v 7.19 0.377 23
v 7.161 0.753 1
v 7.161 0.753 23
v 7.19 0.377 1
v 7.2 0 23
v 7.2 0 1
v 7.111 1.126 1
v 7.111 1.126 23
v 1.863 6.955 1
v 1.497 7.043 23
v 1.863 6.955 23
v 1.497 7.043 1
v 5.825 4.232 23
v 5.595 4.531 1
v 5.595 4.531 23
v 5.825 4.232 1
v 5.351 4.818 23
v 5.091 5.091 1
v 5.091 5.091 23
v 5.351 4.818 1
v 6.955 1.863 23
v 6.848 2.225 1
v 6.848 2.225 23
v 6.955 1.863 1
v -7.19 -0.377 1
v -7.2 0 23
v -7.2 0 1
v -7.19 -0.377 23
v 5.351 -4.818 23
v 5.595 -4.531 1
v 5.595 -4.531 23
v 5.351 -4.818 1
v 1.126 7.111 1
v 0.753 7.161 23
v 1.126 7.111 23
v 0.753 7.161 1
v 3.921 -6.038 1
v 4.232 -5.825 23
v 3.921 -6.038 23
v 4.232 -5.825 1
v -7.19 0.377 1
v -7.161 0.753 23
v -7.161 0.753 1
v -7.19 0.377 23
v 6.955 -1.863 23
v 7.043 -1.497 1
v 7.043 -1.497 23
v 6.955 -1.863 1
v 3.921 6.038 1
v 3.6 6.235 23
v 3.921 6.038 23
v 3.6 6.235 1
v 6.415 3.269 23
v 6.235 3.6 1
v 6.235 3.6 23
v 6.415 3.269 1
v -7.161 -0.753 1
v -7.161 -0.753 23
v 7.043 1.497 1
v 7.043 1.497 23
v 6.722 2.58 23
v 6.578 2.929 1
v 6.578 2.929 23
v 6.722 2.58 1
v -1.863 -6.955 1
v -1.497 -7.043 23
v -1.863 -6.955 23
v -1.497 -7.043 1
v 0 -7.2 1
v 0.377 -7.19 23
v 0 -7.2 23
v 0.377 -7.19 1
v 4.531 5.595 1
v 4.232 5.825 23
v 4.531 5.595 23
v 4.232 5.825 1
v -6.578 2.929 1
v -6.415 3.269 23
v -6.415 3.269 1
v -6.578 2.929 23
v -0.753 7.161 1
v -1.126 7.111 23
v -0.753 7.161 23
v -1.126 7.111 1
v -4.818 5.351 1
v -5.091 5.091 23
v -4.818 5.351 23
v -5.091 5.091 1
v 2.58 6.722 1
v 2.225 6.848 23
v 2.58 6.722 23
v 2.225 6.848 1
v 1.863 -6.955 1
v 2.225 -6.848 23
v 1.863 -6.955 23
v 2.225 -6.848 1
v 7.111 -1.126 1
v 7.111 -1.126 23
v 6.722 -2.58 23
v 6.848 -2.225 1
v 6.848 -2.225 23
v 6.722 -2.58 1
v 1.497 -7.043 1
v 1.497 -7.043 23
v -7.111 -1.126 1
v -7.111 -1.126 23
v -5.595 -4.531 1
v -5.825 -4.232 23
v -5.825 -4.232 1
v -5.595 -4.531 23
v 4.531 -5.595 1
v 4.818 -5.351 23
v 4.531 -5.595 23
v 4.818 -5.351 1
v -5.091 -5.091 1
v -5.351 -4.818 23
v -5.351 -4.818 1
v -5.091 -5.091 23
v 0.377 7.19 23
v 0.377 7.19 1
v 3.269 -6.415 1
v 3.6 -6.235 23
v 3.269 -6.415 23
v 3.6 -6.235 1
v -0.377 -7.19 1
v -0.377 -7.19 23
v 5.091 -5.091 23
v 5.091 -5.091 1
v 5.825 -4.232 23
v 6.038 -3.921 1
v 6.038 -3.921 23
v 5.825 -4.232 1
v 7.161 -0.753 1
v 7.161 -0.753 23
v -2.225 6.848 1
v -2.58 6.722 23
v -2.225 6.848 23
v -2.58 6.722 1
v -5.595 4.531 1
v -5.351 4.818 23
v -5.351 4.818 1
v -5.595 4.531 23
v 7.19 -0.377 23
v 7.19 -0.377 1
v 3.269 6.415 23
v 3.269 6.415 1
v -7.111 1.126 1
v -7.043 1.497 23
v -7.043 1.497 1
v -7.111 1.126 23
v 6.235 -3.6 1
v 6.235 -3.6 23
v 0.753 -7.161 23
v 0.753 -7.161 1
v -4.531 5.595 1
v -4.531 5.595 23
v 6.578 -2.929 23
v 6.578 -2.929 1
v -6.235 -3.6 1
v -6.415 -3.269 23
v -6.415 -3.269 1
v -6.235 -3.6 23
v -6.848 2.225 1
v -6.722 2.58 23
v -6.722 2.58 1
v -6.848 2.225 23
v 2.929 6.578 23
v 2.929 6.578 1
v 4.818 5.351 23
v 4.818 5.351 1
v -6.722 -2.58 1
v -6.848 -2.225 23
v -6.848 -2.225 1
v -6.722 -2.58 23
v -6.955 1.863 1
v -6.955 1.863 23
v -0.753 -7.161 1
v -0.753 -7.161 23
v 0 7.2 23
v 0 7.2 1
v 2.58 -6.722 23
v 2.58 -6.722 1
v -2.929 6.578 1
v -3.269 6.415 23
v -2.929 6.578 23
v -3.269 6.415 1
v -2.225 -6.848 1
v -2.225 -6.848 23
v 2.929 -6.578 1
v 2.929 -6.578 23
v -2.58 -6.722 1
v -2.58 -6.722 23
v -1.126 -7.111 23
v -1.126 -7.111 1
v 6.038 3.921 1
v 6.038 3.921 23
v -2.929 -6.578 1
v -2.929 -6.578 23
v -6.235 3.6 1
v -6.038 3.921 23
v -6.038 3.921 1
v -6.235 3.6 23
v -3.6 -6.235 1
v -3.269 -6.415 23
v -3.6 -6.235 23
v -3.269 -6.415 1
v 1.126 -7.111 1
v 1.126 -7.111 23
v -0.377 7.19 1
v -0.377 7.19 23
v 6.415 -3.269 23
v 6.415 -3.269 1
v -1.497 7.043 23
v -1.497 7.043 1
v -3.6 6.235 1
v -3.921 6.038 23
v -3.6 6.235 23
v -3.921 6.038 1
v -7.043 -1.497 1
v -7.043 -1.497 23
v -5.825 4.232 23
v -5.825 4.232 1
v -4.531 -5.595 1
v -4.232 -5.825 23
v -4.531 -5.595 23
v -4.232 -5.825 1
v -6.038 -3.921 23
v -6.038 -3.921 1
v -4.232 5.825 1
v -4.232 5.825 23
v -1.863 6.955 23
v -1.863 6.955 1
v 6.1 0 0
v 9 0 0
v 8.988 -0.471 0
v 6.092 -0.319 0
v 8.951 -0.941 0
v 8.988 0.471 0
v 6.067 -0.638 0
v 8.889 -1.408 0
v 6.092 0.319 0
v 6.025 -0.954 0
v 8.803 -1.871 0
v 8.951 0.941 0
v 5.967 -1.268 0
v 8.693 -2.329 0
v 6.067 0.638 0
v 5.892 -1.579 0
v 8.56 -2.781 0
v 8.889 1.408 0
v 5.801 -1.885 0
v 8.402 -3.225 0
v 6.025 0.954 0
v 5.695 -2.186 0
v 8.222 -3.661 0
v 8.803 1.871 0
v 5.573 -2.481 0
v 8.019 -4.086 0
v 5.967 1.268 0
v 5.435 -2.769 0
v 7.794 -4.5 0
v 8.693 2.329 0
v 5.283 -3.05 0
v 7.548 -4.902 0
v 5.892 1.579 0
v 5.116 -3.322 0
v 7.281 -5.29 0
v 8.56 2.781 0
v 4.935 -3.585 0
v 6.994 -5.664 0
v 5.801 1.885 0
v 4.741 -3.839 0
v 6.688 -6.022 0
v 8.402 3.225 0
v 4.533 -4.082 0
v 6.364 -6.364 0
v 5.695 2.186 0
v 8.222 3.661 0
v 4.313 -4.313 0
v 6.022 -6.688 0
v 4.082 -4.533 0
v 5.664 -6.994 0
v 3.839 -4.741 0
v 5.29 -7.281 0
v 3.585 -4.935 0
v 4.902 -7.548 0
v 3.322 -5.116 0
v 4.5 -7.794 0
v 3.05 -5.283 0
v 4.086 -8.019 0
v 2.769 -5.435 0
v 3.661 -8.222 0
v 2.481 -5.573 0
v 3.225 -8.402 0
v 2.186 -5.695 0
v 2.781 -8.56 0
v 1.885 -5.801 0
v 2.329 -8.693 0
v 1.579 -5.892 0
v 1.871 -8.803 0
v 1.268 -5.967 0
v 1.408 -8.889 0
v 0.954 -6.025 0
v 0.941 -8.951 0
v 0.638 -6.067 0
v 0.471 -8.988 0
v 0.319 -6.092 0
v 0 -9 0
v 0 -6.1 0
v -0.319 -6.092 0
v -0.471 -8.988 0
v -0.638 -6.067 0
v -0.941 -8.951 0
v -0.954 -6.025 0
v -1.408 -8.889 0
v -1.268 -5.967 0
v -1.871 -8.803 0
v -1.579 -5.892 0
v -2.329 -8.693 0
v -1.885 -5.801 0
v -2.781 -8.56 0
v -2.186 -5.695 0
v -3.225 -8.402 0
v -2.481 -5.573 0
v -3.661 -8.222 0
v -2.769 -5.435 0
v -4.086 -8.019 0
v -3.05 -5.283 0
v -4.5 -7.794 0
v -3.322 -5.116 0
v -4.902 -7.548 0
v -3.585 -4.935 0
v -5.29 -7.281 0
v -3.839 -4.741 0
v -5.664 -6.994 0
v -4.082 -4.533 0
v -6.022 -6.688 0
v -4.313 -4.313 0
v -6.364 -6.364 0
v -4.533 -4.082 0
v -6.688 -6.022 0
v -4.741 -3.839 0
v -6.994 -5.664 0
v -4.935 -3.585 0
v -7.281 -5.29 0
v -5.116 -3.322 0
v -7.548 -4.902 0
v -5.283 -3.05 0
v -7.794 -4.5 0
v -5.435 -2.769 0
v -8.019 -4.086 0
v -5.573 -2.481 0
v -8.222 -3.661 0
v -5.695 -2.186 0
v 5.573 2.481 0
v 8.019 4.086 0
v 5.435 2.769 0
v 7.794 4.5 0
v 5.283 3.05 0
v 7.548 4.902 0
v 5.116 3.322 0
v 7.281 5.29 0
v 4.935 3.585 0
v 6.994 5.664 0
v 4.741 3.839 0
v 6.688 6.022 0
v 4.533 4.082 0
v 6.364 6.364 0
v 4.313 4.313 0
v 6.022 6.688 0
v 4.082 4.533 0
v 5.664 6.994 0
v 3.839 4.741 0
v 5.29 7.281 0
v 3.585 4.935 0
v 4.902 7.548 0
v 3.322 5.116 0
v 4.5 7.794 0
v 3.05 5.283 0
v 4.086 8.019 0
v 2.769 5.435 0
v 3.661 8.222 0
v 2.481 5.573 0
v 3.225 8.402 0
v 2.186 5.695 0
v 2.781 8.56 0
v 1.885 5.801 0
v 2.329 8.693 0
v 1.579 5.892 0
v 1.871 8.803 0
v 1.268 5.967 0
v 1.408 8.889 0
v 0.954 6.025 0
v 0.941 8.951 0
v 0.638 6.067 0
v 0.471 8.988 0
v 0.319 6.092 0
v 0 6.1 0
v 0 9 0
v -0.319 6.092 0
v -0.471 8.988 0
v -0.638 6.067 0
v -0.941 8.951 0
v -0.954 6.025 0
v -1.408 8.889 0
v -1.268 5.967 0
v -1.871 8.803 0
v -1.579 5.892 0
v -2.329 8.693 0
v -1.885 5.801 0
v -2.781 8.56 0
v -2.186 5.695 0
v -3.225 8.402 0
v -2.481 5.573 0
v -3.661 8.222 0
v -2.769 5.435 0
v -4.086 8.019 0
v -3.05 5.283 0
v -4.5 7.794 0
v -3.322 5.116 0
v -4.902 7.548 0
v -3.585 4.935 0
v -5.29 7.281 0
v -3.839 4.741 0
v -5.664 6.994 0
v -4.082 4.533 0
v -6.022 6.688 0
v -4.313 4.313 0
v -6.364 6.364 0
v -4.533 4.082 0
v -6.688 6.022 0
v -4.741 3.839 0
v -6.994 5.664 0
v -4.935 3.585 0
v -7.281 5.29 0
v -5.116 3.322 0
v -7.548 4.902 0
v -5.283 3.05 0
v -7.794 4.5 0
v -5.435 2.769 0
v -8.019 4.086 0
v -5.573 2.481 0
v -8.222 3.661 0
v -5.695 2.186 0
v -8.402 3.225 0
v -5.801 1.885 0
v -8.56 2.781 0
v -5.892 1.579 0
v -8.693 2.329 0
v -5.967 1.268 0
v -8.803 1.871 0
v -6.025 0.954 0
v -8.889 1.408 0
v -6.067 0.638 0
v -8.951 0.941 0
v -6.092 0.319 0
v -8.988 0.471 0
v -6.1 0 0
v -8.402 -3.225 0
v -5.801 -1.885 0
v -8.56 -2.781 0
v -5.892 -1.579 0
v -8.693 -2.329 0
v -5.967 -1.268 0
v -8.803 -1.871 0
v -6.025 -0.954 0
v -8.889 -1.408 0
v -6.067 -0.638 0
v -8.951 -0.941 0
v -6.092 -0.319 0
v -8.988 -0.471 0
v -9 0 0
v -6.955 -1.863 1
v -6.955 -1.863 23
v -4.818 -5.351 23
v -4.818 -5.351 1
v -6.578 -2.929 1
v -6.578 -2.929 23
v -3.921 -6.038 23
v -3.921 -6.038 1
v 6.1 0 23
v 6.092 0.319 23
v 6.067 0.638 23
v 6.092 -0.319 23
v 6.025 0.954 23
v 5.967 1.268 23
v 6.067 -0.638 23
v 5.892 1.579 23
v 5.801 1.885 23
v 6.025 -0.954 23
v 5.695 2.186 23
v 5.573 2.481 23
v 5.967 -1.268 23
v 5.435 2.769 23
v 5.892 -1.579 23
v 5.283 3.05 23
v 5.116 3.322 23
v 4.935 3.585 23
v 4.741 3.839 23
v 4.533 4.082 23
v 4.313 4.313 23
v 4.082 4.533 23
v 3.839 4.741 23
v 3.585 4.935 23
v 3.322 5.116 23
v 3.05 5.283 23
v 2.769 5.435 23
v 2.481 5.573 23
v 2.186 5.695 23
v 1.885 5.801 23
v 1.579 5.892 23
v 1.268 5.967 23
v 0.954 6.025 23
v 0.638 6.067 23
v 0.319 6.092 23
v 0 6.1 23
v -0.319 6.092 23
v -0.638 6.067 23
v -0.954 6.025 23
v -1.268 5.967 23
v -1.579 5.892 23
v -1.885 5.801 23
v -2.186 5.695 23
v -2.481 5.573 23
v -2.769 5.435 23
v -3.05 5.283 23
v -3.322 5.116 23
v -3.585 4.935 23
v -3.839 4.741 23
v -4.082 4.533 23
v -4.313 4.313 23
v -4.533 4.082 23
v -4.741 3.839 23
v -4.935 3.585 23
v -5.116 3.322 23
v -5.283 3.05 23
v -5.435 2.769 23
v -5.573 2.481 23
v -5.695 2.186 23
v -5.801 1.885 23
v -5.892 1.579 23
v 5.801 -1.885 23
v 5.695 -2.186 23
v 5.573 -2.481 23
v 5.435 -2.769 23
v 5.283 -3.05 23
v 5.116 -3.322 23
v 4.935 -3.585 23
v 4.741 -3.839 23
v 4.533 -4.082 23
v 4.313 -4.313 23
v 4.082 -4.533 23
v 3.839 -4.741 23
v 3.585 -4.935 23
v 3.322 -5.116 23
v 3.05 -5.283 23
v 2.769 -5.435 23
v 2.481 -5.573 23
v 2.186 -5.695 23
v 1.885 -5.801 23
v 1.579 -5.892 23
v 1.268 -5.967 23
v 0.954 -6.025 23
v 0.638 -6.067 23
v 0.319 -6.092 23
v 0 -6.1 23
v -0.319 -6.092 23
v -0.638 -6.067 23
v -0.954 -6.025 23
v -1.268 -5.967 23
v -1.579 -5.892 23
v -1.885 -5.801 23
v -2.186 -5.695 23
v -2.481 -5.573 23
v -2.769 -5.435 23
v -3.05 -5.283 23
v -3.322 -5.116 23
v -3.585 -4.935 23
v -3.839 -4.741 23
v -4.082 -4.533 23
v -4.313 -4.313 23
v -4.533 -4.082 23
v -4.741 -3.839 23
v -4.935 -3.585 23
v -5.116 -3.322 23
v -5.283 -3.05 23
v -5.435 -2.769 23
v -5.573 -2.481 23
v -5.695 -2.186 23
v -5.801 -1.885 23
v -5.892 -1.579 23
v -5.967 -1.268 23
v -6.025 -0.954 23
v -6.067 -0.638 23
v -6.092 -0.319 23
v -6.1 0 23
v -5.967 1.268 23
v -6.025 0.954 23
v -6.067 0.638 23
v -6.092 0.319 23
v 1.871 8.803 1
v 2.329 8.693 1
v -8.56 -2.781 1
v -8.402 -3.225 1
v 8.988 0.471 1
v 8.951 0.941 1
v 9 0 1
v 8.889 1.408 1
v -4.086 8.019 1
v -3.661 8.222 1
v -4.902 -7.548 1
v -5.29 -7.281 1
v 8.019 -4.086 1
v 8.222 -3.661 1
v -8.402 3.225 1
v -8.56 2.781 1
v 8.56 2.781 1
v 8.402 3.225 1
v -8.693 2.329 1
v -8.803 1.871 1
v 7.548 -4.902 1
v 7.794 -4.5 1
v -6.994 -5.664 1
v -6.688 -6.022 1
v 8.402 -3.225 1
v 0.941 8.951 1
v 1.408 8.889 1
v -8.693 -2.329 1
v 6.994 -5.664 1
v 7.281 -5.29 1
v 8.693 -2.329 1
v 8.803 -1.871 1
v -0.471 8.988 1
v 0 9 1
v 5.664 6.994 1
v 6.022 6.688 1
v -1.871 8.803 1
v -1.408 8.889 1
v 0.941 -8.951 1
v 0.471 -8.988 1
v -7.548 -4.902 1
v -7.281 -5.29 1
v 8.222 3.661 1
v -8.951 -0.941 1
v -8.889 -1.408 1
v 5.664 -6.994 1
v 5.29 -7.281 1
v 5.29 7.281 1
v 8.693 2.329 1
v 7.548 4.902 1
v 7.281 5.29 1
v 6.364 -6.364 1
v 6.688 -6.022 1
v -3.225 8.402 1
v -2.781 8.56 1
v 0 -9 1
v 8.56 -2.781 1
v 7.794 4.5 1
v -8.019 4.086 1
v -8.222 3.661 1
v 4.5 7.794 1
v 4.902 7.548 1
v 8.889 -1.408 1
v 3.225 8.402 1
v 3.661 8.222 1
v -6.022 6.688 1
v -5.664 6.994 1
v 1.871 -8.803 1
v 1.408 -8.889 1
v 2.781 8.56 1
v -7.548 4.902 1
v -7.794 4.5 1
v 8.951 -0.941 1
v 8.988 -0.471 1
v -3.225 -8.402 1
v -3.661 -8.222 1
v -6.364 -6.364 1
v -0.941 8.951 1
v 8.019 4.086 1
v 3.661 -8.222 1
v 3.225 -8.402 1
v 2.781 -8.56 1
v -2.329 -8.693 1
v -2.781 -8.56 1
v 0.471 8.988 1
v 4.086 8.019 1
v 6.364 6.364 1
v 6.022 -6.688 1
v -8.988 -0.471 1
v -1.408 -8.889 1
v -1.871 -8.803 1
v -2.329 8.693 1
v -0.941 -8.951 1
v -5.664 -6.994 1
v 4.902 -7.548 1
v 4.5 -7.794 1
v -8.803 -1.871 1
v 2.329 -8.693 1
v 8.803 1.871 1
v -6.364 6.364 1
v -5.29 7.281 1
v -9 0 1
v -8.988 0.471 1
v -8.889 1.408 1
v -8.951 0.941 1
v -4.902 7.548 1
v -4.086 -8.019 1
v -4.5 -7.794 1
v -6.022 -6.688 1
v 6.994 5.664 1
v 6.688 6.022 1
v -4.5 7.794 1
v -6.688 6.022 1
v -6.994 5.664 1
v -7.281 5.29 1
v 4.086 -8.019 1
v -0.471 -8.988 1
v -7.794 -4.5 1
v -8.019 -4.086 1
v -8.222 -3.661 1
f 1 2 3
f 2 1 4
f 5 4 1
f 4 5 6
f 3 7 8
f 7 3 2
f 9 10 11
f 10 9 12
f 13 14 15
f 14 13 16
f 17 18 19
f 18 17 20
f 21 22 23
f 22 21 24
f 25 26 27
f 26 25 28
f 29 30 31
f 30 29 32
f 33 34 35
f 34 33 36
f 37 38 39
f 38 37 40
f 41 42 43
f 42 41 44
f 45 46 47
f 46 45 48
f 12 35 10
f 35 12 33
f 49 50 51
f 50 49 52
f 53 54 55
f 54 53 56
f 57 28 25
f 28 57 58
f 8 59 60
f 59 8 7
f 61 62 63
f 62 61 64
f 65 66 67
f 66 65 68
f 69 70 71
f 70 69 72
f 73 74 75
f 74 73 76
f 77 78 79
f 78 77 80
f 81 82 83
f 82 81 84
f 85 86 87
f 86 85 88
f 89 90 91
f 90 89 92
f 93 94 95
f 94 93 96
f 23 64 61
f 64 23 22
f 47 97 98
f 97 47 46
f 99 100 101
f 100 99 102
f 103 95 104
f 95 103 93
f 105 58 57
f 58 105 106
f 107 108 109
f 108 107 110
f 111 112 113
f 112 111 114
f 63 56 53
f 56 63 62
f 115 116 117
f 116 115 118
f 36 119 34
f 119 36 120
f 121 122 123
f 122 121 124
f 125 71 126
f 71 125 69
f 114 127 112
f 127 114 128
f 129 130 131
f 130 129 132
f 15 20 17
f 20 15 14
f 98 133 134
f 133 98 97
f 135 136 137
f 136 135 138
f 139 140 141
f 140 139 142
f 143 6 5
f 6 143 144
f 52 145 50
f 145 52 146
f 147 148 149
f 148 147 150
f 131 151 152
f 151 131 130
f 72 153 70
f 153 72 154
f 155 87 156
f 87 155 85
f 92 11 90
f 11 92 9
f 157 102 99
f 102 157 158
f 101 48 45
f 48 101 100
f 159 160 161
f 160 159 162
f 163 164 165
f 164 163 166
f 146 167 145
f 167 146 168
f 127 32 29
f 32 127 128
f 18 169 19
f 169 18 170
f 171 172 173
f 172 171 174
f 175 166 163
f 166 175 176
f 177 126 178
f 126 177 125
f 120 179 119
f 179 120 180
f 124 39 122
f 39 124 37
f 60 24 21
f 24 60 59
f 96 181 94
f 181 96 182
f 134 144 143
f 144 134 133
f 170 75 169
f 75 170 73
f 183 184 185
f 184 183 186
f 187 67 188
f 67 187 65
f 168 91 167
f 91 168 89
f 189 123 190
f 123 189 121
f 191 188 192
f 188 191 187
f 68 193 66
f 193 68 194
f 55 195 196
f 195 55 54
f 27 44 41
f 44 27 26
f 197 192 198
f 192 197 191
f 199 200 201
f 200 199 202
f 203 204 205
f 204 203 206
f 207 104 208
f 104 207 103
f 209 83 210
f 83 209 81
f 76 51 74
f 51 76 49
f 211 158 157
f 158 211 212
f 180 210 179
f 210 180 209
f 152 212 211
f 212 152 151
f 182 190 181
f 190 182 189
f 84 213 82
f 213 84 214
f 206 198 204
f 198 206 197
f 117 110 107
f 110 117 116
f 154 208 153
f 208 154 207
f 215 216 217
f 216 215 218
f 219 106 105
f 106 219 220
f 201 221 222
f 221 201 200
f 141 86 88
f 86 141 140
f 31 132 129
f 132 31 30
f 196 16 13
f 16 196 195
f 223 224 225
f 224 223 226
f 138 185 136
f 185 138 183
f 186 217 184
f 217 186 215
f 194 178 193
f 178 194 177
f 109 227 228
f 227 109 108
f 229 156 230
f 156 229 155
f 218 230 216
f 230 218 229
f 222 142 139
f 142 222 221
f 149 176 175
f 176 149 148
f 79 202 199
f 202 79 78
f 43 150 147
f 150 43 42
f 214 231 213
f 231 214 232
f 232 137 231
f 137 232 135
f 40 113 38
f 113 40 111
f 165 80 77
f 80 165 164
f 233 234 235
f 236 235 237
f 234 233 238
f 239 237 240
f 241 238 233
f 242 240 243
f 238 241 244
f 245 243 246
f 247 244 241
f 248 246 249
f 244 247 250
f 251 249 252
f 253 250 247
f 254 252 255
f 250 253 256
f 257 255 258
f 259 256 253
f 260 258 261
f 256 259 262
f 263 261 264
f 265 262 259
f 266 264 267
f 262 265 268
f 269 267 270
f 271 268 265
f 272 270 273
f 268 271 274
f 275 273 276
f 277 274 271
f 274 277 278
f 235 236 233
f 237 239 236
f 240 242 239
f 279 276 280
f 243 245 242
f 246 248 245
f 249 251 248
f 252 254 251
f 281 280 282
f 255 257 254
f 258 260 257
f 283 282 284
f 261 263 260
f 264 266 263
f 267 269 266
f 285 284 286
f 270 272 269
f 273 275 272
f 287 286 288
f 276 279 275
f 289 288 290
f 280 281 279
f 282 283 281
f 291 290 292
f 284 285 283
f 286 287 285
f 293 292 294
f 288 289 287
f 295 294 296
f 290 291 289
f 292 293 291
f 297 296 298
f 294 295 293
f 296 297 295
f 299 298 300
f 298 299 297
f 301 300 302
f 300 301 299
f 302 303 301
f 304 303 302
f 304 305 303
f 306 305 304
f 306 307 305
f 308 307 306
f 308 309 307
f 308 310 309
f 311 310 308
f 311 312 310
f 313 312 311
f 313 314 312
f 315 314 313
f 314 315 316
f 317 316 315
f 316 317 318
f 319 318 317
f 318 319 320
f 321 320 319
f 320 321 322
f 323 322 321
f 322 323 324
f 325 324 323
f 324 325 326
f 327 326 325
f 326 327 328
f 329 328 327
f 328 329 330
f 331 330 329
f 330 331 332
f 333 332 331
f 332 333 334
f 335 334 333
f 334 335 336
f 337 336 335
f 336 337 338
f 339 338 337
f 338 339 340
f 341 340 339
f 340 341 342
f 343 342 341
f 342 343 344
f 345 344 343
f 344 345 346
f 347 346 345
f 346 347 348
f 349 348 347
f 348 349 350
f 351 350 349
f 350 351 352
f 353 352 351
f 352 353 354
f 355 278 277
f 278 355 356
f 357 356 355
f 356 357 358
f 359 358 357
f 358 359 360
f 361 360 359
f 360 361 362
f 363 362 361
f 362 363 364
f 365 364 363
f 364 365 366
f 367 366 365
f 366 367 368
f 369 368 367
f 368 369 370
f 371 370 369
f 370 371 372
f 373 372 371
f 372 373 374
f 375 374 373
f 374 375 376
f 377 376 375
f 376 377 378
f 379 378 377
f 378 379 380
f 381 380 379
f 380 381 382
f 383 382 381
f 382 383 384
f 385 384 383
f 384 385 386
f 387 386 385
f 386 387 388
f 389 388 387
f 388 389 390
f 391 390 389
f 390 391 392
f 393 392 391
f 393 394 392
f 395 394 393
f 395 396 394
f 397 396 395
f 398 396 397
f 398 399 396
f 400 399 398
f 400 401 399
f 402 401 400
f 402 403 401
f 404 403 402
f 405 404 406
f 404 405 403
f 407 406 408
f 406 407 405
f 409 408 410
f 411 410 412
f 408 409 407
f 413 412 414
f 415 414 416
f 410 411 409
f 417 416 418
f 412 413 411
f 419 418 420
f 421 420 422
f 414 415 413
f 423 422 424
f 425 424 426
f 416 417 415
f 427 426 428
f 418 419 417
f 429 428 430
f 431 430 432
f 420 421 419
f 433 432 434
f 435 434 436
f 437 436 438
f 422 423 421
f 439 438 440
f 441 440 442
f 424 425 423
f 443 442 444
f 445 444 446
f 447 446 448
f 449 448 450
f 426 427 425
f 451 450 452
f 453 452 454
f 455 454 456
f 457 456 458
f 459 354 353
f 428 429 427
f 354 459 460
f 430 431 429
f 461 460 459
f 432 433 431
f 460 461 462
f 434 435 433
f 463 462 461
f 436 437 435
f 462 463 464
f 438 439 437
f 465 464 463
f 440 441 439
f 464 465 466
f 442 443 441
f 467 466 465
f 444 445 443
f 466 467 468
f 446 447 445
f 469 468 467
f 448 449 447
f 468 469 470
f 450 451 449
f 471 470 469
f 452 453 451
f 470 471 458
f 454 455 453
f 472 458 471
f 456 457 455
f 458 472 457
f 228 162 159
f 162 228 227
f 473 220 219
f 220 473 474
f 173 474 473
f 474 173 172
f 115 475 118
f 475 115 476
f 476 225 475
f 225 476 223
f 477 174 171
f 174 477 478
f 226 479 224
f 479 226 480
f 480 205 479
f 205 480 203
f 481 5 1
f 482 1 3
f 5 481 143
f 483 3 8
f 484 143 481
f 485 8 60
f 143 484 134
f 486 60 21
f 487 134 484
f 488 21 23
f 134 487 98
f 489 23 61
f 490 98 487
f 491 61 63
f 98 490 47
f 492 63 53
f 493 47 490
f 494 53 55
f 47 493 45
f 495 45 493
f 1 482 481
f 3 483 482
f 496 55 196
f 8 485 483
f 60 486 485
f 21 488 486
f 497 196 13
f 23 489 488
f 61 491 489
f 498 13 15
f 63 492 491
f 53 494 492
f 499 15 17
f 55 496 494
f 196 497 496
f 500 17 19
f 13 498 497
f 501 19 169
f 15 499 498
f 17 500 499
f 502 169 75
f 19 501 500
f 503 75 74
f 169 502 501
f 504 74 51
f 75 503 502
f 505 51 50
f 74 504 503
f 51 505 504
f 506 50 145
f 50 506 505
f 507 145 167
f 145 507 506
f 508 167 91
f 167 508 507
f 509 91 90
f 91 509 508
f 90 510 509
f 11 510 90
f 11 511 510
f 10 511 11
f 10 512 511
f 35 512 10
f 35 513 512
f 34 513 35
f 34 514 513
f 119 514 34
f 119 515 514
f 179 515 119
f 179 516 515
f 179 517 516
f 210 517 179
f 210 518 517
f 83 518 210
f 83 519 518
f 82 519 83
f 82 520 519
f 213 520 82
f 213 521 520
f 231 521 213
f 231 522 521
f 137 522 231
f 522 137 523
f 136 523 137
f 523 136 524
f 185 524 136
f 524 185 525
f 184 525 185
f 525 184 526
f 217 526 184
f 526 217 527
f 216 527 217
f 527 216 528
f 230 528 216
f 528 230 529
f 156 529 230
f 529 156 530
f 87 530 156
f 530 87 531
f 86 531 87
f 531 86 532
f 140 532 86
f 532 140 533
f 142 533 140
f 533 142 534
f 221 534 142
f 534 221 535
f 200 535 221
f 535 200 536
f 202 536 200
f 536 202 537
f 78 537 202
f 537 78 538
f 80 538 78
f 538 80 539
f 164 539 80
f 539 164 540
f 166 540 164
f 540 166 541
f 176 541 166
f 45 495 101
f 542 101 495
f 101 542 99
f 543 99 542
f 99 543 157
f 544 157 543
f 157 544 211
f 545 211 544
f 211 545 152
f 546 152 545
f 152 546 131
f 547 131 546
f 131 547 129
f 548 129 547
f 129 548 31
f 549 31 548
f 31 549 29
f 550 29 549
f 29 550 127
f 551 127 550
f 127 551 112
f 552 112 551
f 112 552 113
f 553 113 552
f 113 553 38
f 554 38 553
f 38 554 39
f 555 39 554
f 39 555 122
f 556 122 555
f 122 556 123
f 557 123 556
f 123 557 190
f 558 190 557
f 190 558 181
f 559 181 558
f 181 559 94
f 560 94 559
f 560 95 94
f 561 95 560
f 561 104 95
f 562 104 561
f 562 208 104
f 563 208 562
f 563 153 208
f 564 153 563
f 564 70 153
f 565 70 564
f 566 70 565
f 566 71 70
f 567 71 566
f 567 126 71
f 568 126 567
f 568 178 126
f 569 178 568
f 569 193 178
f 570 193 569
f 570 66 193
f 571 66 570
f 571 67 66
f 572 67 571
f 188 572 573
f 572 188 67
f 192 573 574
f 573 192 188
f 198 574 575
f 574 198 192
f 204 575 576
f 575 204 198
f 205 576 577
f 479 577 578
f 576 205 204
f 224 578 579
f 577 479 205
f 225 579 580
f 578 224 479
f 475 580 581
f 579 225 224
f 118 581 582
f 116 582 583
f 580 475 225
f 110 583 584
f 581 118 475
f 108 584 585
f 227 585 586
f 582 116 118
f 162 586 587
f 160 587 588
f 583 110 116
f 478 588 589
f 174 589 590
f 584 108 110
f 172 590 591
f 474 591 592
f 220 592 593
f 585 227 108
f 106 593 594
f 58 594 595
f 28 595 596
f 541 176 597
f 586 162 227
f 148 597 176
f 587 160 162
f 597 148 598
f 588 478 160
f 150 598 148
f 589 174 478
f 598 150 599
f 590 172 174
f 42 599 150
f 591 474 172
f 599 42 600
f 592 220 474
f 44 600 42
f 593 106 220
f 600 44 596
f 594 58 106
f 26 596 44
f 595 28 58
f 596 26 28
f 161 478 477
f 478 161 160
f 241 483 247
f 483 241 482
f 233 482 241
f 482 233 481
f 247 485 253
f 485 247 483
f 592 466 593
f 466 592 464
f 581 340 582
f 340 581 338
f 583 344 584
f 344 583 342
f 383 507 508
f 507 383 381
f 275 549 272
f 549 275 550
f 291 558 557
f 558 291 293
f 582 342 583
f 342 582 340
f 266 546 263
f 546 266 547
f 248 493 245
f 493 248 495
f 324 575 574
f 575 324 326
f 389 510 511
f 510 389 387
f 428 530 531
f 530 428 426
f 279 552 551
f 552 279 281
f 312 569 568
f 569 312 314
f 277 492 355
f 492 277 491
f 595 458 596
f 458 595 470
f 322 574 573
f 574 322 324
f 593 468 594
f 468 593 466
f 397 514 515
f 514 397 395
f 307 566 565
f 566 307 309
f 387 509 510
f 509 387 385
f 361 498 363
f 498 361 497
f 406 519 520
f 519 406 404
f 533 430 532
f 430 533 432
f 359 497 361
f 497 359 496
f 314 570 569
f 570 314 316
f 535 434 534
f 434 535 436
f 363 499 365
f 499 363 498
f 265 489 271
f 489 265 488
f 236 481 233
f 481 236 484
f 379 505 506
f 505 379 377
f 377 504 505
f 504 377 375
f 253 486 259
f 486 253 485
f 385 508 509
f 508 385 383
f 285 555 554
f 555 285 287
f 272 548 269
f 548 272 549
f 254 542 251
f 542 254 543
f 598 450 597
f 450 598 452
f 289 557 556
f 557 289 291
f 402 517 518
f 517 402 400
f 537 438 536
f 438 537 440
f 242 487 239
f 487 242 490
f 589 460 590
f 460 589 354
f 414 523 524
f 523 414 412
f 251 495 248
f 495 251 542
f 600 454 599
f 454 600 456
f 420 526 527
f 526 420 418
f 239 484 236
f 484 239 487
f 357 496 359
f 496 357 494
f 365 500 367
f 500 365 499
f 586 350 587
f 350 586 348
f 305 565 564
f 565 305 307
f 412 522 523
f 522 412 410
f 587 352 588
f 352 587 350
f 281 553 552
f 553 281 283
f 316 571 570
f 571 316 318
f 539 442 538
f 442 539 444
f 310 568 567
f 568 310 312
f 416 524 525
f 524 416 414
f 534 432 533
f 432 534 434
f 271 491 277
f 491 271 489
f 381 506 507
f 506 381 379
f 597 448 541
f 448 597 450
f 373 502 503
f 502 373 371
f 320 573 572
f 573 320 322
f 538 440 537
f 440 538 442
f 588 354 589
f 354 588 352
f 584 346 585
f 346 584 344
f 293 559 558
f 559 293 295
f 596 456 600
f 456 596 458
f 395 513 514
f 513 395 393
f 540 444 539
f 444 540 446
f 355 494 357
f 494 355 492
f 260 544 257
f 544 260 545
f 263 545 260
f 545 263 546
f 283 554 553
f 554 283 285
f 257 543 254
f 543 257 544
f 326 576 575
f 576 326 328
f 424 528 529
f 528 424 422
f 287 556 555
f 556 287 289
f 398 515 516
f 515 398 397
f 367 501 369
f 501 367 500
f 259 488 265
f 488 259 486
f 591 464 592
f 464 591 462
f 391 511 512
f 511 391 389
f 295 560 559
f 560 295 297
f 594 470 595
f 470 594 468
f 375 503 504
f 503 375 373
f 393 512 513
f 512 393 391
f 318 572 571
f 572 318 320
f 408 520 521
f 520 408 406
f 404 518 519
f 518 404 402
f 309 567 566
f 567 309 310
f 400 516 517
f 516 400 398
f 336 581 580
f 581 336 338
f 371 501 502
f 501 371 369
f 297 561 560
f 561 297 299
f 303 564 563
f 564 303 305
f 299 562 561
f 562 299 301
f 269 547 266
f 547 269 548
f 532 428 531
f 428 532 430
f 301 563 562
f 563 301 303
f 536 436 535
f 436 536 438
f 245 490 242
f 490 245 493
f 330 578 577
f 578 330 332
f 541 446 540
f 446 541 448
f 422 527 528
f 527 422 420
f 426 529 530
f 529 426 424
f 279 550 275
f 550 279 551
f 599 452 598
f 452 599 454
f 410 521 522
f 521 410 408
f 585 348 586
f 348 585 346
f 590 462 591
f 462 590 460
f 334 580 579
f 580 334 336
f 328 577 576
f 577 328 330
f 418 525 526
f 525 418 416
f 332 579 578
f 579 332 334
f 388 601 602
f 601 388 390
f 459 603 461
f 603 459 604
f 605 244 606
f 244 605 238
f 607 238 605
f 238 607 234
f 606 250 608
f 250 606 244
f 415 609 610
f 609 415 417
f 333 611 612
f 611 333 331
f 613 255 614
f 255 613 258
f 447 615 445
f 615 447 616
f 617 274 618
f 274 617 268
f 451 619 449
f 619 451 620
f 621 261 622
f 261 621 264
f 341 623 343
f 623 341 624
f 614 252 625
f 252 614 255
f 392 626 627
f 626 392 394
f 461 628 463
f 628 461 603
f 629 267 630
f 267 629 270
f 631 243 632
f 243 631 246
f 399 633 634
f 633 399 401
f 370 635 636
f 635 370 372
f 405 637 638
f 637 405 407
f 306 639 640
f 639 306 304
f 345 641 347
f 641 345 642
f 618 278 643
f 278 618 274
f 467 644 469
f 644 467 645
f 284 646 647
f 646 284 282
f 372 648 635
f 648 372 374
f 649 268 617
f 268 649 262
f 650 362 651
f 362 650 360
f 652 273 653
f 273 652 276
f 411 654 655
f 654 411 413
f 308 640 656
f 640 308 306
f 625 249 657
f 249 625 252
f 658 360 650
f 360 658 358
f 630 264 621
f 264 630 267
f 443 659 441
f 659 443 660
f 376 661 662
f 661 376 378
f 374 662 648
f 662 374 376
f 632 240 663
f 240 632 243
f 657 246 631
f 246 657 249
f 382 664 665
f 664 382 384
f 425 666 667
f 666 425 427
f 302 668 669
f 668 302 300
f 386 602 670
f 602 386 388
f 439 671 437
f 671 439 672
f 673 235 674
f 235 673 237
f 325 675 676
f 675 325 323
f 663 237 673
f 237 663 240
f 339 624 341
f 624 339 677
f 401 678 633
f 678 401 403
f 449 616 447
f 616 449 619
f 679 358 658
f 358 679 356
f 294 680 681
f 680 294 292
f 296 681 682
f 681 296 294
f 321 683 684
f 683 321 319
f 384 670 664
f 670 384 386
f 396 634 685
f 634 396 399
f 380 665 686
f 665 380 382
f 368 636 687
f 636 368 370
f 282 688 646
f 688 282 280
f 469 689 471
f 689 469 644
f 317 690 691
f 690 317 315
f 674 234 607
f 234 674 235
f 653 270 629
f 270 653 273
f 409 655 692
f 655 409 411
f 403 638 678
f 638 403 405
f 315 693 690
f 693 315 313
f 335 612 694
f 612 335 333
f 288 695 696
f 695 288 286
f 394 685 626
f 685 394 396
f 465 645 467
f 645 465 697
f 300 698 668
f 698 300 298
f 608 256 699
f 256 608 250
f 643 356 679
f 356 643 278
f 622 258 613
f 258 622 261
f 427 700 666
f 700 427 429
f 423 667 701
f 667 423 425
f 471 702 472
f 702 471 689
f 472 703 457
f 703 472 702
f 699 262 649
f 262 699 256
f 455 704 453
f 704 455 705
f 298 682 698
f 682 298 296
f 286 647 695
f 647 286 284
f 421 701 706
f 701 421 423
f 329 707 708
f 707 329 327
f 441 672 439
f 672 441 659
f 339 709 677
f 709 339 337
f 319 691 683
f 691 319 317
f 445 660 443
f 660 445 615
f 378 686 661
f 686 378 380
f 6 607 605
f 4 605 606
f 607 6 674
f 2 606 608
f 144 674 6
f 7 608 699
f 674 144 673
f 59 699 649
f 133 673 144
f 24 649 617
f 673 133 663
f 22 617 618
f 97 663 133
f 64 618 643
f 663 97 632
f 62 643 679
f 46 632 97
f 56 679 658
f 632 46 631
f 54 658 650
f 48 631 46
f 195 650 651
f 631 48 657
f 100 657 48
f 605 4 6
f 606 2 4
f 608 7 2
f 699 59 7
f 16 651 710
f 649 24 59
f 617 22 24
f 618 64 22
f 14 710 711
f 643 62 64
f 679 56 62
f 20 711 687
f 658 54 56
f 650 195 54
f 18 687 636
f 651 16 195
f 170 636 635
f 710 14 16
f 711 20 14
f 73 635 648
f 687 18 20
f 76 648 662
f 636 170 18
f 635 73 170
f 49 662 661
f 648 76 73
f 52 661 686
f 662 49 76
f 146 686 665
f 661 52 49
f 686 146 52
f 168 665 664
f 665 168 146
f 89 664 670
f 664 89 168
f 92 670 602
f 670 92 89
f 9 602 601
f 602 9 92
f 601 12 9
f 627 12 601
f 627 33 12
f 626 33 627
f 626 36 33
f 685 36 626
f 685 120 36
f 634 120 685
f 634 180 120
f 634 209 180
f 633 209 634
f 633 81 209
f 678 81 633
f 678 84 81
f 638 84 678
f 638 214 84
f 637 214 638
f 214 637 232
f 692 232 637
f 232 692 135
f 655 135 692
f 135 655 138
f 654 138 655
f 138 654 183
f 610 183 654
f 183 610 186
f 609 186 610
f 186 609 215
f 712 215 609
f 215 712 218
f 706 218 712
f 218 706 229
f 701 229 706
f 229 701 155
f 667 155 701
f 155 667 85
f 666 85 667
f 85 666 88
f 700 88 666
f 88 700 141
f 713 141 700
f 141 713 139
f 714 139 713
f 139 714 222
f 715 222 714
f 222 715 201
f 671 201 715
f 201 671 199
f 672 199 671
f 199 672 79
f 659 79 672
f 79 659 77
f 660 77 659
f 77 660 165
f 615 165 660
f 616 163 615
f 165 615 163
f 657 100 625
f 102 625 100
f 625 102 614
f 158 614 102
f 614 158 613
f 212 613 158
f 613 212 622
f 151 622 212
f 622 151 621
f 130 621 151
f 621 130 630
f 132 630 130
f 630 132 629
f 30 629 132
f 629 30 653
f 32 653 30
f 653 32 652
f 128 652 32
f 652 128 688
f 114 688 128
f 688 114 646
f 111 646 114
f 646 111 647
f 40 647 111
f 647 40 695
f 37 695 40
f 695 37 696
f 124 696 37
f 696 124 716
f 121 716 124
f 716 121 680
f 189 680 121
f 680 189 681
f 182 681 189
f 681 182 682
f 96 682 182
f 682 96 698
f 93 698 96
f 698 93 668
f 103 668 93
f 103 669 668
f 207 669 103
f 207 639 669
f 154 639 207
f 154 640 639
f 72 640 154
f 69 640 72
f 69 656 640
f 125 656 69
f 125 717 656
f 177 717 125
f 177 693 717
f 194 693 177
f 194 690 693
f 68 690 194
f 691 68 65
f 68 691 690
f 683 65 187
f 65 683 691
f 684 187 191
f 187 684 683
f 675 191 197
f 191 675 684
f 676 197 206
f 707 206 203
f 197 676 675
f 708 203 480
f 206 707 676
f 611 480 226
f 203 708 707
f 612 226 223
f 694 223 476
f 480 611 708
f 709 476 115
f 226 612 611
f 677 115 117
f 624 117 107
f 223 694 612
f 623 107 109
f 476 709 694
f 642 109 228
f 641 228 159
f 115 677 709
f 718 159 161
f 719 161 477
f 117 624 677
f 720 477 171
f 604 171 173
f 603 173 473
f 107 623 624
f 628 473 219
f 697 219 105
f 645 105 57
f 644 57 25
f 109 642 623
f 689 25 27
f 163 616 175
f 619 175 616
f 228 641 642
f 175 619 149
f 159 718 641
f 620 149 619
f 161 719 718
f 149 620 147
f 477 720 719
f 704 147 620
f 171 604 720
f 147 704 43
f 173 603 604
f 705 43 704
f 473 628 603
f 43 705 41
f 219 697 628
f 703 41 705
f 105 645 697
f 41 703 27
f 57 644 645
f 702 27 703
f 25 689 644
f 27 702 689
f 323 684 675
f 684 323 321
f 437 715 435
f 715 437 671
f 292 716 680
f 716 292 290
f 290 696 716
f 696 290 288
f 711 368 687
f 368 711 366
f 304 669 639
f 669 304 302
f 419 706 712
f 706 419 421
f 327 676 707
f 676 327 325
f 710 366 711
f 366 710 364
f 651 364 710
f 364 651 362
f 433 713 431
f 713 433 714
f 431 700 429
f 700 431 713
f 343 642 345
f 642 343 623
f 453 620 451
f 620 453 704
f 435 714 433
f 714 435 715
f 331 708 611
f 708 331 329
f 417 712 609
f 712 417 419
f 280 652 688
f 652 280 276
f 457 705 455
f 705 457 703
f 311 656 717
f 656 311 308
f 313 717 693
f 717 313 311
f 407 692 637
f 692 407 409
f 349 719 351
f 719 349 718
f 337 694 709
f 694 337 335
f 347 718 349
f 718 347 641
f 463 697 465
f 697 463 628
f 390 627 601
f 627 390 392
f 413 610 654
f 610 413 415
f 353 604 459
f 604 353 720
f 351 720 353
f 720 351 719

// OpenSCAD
$fn = $preview ? 30 : 120;
epsilon = 0.001;

module thing() {
    difference() {
        cylinder(h = 23, d = 14.4, center = false);
        translate([0, 0, -1])
            cylinder(h = 24, d = 12.2, center = false);
    }

    difference() {
        cylinder(h = 1, d = 18, center = false);
        cylinder(h = 1, d = 12.2, center = false);
    }
}

thing();
